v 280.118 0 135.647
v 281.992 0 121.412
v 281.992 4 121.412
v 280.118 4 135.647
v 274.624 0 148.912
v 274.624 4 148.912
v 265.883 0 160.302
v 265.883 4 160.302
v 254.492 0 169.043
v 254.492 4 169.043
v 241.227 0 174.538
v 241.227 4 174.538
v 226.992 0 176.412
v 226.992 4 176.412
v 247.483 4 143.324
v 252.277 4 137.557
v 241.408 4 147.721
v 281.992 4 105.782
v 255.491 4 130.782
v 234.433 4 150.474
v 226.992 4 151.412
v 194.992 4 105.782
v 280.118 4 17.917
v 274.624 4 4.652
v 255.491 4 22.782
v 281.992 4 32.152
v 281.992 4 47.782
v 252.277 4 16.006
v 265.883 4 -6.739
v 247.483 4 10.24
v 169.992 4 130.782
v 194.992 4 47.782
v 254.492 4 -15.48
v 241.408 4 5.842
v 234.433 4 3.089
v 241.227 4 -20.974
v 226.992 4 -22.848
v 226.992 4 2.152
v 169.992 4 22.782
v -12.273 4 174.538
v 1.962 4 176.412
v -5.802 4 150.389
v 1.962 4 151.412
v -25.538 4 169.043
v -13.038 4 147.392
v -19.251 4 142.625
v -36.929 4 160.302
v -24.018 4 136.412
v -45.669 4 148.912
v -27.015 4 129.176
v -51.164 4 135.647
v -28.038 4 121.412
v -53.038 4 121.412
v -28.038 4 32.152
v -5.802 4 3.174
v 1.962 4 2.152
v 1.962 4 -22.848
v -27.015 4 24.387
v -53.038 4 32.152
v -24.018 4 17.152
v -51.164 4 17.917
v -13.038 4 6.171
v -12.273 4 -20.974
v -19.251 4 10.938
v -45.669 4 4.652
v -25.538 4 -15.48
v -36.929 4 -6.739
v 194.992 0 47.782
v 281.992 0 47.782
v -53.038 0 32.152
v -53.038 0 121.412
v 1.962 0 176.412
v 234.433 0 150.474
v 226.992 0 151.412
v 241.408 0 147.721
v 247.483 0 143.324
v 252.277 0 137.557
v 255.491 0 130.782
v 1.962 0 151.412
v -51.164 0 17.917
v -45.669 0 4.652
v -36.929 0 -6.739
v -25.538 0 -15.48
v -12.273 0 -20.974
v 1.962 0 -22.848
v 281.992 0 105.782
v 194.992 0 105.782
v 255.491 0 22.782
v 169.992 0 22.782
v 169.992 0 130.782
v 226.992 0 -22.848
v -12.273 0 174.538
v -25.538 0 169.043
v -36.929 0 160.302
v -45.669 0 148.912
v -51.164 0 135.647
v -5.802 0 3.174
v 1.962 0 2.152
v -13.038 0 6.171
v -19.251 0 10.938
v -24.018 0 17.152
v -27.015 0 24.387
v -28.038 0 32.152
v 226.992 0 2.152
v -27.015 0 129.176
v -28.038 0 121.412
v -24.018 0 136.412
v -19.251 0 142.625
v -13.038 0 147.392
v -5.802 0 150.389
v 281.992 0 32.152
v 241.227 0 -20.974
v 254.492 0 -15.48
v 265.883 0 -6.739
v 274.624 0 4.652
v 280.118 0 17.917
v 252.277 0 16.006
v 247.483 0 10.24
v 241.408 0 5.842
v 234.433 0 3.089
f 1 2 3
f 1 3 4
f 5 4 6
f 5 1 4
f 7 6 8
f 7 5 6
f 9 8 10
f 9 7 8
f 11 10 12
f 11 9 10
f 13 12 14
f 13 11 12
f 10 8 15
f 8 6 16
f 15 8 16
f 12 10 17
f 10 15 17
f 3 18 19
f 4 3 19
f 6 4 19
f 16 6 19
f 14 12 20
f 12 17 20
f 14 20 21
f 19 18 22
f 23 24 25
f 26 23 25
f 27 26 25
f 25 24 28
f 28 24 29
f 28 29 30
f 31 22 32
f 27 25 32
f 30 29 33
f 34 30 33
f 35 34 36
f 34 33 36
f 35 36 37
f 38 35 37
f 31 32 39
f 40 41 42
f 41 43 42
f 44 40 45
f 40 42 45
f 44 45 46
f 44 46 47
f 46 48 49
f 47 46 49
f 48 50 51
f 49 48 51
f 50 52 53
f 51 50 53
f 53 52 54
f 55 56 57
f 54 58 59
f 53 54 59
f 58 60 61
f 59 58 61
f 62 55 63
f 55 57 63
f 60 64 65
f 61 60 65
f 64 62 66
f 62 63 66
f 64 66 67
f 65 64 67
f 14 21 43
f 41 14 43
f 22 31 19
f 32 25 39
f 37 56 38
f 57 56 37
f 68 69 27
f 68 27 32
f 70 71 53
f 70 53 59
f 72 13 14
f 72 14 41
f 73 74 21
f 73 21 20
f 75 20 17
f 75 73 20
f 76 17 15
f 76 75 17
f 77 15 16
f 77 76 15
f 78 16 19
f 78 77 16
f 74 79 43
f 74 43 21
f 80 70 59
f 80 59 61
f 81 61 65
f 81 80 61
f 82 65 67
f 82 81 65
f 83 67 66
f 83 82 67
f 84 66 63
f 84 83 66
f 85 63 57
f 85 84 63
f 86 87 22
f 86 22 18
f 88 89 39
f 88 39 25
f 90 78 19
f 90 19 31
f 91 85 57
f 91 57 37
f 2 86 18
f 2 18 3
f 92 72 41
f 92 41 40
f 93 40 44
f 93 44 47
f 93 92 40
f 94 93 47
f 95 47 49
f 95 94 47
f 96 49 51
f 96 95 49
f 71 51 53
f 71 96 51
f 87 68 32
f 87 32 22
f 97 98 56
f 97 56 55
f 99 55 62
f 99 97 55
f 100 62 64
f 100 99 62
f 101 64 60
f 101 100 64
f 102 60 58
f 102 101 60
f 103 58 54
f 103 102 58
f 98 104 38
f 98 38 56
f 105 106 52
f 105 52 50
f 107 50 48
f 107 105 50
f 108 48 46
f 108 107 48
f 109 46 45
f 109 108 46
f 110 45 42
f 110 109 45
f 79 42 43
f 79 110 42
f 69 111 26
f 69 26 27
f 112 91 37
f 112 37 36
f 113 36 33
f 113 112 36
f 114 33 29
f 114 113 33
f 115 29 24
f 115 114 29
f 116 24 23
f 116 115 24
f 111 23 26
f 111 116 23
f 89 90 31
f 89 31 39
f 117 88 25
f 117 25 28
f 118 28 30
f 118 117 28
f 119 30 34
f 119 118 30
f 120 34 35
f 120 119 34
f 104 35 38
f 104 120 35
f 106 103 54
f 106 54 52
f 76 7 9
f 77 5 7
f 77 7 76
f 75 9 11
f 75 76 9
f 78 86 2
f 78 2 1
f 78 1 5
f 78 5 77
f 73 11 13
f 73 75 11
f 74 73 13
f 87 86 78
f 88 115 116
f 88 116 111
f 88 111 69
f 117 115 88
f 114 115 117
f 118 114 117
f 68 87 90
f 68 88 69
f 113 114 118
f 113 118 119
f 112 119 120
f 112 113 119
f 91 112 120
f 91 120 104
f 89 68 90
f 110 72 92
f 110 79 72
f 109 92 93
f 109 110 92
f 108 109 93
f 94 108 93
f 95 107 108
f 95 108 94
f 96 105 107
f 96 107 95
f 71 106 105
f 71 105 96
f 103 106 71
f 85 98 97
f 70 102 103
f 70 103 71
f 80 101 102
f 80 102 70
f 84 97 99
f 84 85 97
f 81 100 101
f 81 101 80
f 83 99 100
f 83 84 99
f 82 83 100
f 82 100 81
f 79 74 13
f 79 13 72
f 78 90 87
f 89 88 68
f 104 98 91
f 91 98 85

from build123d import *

# Parameters (mm, degrees)
BOSS_EXTRUDE1_DEPTH = 4


with BuildPart() as part:
    # Sketch1 → Boss-Extrude1 (new body)
    with BuildSketch(Plane(origin=(0, 0, 0), x_dir=(1, 0, 0), z_dir=(0, 1, 0))):
        with BuildLine():
            Line((281.992313692, -105.781584964), (281.992313692, -121.411584964))
            ThreePointArc((281.992313692, -121.411584964), (265.883186657, -160.302457929), (226.992313692, -176.411584964))
            Line((226.992313692, -176.411584964), (1.962313692, -176.411584964))
            ThreePointArc((1.962313692, -176.411584964), (-36.928559274, -160.302457929), (-53.037686308, -121.411584964))
            Line((-53.037686308, -121.411584964), (-53.037686308, -32.151584964))
            ThreePointArc((-53.037686308, -32.151584964), (-36.928559274, 6.739288001), (1.962313692, 22.848415036))
            Line((1.962313692, 22.848415036), (226.992313692, 22.848415036))
            ThreePointArc((226.992313692, 22.848415036), (265.883186657, 6.739288001), (281.992313692, -32.151584964))
            Line((281.992313692, -32.151584964), (281.992313692, -47.781584964))
            Line((281.992313692, -47.781584964), (194.992313692, -47.781584964))
            Line((194.992313692, -47.781584964), (194.992313692, -105.781584964))
            Line((194.992313692, -105.781584964), (281.992313692, -105.781584964))
        make_face()
        with BuildLine():
            Line((1.962313692, -151.411584964), (226.992313692, -151.411584964))
            ThreePointArc((226.992313692, -151.411584964), (244.583504669, -145.712819501), (255.491490873, -130.781584964))
            Line((255.491490873, -130.781584964), (169.992313692, -130.781584964))
            Line((169.992313692, -130.781584964), (169.992313692, -22.781584964))
            Line((169.992313692, -22.781584964), (255.491490873, -22.781584964))
            ThreePointArc((255.491490873, -22.781584964), (244.583504669, -7.850350427), (226.992313692, -2.151584964))
            Line((226.992313692, -2.151584964), (1.962313692, -2.151584964))
            ThreePointArc((1.962313692, -2.151584964), (-19.250889744, -10.938381528), (-28.037686308, -32.151584964))
            Line((-28.037686308, -32.151584964), (-28.037686308, -121.411584964))
            ThreePointArc((-28.037686308, -121.411584964), (-19.250889744, -142.6247884), (1.962313692, -151.411584964))
        make_face(mode=Mode.SUBTRACT)
    extrude(amount=BOSS_EXTRUDE1_DEPTH)


solid = part.part
